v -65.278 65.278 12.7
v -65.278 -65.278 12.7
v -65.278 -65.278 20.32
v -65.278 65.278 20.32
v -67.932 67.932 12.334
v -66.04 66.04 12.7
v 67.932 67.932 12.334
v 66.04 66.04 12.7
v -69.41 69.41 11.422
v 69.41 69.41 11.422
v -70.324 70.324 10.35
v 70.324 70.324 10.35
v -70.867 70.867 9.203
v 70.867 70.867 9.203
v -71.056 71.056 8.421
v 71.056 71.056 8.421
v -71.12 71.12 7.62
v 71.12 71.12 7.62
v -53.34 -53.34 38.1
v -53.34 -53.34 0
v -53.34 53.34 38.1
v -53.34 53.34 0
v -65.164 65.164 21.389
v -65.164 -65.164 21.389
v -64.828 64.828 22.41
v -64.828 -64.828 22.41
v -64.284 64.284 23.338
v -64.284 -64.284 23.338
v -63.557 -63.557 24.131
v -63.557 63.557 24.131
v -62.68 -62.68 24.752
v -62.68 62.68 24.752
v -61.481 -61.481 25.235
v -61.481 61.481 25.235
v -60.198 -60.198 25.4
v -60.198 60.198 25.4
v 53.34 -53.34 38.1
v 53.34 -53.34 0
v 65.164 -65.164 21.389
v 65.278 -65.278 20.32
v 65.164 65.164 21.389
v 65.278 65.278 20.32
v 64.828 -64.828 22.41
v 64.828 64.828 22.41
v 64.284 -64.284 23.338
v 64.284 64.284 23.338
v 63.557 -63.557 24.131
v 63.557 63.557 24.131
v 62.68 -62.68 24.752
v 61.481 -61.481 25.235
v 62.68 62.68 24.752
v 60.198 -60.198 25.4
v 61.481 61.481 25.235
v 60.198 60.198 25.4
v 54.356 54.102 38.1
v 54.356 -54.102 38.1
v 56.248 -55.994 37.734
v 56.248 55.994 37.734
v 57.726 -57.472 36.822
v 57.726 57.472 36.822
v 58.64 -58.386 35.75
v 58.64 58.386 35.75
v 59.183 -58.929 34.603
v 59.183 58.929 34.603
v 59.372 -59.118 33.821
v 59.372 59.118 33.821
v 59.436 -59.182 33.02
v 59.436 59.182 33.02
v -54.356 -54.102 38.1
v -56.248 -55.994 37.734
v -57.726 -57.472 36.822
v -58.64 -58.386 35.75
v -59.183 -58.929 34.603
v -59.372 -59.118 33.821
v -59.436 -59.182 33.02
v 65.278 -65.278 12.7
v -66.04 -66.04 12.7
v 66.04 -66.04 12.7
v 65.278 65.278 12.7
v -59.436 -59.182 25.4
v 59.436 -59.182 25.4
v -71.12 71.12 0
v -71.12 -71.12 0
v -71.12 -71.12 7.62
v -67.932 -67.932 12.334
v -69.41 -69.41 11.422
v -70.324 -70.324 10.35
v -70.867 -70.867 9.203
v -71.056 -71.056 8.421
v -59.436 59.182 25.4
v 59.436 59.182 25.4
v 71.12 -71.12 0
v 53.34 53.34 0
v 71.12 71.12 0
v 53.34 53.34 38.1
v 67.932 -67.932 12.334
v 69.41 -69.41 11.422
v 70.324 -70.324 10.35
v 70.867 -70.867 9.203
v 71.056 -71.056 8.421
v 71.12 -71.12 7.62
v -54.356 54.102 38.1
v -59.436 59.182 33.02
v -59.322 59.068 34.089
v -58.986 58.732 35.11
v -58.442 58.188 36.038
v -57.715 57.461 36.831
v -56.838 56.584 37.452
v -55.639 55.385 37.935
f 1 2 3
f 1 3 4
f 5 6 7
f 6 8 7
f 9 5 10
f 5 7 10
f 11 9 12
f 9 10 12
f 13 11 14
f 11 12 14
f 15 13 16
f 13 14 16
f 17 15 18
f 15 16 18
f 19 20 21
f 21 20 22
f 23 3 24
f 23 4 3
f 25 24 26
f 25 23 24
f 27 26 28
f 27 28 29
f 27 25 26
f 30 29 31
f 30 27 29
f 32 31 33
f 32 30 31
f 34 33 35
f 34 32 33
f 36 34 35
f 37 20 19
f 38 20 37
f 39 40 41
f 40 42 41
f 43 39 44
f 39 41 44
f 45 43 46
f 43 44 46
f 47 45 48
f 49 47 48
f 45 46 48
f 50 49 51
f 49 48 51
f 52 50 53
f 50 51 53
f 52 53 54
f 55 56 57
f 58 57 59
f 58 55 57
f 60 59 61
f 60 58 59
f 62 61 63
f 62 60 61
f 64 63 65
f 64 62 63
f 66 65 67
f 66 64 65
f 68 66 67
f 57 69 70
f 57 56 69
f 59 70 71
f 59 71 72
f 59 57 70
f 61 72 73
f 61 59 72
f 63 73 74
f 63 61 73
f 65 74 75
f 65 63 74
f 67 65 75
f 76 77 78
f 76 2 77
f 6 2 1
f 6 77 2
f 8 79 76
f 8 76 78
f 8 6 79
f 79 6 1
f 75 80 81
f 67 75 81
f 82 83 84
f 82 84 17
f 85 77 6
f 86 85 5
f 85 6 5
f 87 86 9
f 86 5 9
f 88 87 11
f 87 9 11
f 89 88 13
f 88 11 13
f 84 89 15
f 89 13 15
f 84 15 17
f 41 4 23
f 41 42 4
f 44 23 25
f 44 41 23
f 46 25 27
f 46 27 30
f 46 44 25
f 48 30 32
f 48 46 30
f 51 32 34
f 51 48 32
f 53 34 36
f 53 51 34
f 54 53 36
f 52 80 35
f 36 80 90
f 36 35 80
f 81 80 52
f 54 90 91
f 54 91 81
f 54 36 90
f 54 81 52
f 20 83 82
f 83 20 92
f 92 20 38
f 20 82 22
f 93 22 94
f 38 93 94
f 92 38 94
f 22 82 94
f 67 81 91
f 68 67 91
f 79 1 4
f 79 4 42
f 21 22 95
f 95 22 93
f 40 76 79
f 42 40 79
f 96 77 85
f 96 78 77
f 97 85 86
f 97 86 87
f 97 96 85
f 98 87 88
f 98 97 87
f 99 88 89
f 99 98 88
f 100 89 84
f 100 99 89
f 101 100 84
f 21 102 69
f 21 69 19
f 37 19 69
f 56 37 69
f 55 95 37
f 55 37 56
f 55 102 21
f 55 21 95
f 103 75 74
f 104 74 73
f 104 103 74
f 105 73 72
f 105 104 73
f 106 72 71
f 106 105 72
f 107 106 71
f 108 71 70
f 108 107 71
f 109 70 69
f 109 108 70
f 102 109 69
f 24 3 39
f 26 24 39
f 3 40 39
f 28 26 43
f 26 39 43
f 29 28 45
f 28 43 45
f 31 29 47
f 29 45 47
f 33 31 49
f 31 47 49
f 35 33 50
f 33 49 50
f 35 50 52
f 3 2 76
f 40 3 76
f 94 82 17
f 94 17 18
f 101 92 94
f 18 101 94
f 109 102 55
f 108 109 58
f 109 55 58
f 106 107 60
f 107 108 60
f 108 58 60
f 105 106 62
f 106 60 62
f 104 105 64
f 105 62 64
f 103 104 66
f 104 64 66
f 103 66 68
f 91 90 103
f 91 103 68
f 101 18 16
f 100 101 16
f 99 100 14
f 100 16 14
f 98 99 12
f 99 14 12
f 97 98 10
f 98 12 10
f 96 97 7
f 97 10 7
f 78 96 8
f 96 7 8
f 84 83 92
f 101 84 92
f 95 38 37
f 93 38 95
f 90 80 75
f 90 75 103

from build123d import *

# Parameters (mm, degrees)
F0_W     = 142.24
F0_H     = 142.24
F1_DEPTH = 12.7
F2_W     = 106.68
F2_H     = 106.68
F3_DEPTH = 12.701
F4_W     = 130.556
F4_H     = 130.556
F4_W_2   = 106.68
F4_H_2   = 106.68
F5_DEPTH = 12.7
F6_W     = 118.872
F6_H     = 118.364
F6_W_2   = 106.68
F6_H_2   = 106.68
F7_DEPTH = 12.7
F8_R     = 5.08


with BuildPart() as f1:
    # F0 (on Top) → F1 (new body)
    with BuildSketch(Plane.XY):
        Rectangle(F0_W, F0_H)
    extrude(amount=F1_DEPTH)

    # F2 (on face) → F3 (cut, through all)
    with BuildSketch(Plane.XY.offset(12.7)):
        Rectangle(F2_W, F2_H)
    extrude(amount=-F3_DEPTH, mode=Mode.SUBTRACT)

    # F4 (on face) → F5 (join)
    with BuildSketch(Plane.XY.offset(12.7)):
        Rectangle(F4_W, F4_H)
        Rectangle(F4_W_2, F4_H_2, mode=Mode.SUBTRACT)
    extrude(amount=F5_DEPTH)

    # F6 (on face) → F7 (join)
    with BuildSketch(Plane.XY.offset(25.4)):
        Rectangle(F6_W, F6_H)
        Rectangle(F6_W_2, F6_H_2, mode=Mode.SUBTRACT)
    extrude(amount=F7_DEPTH)

    # F8
    f8_edges = [f1.edges().sort_by_distance(p)[0] for p in [
        (0, -59.182, 38.1),
        (-59.436, 0, 38.1),
        (0, -65.278, 25.4),
        (0, -71.12, 12.7),
        (-71.12, 0, 12.7),
        (-65.278, 0, 25.4),
        (0, 71.12, 12.7),
        (0, 65.278, 25.4),
        (0, 59.182, 38.1),
        (59.436, 0, 38.1),
        (65.278, 0, 25.4),
        (71.12, 0, 12.7),
    ]]
    fillet(f8_edges, radius=F8_R)


solid = f1.part
